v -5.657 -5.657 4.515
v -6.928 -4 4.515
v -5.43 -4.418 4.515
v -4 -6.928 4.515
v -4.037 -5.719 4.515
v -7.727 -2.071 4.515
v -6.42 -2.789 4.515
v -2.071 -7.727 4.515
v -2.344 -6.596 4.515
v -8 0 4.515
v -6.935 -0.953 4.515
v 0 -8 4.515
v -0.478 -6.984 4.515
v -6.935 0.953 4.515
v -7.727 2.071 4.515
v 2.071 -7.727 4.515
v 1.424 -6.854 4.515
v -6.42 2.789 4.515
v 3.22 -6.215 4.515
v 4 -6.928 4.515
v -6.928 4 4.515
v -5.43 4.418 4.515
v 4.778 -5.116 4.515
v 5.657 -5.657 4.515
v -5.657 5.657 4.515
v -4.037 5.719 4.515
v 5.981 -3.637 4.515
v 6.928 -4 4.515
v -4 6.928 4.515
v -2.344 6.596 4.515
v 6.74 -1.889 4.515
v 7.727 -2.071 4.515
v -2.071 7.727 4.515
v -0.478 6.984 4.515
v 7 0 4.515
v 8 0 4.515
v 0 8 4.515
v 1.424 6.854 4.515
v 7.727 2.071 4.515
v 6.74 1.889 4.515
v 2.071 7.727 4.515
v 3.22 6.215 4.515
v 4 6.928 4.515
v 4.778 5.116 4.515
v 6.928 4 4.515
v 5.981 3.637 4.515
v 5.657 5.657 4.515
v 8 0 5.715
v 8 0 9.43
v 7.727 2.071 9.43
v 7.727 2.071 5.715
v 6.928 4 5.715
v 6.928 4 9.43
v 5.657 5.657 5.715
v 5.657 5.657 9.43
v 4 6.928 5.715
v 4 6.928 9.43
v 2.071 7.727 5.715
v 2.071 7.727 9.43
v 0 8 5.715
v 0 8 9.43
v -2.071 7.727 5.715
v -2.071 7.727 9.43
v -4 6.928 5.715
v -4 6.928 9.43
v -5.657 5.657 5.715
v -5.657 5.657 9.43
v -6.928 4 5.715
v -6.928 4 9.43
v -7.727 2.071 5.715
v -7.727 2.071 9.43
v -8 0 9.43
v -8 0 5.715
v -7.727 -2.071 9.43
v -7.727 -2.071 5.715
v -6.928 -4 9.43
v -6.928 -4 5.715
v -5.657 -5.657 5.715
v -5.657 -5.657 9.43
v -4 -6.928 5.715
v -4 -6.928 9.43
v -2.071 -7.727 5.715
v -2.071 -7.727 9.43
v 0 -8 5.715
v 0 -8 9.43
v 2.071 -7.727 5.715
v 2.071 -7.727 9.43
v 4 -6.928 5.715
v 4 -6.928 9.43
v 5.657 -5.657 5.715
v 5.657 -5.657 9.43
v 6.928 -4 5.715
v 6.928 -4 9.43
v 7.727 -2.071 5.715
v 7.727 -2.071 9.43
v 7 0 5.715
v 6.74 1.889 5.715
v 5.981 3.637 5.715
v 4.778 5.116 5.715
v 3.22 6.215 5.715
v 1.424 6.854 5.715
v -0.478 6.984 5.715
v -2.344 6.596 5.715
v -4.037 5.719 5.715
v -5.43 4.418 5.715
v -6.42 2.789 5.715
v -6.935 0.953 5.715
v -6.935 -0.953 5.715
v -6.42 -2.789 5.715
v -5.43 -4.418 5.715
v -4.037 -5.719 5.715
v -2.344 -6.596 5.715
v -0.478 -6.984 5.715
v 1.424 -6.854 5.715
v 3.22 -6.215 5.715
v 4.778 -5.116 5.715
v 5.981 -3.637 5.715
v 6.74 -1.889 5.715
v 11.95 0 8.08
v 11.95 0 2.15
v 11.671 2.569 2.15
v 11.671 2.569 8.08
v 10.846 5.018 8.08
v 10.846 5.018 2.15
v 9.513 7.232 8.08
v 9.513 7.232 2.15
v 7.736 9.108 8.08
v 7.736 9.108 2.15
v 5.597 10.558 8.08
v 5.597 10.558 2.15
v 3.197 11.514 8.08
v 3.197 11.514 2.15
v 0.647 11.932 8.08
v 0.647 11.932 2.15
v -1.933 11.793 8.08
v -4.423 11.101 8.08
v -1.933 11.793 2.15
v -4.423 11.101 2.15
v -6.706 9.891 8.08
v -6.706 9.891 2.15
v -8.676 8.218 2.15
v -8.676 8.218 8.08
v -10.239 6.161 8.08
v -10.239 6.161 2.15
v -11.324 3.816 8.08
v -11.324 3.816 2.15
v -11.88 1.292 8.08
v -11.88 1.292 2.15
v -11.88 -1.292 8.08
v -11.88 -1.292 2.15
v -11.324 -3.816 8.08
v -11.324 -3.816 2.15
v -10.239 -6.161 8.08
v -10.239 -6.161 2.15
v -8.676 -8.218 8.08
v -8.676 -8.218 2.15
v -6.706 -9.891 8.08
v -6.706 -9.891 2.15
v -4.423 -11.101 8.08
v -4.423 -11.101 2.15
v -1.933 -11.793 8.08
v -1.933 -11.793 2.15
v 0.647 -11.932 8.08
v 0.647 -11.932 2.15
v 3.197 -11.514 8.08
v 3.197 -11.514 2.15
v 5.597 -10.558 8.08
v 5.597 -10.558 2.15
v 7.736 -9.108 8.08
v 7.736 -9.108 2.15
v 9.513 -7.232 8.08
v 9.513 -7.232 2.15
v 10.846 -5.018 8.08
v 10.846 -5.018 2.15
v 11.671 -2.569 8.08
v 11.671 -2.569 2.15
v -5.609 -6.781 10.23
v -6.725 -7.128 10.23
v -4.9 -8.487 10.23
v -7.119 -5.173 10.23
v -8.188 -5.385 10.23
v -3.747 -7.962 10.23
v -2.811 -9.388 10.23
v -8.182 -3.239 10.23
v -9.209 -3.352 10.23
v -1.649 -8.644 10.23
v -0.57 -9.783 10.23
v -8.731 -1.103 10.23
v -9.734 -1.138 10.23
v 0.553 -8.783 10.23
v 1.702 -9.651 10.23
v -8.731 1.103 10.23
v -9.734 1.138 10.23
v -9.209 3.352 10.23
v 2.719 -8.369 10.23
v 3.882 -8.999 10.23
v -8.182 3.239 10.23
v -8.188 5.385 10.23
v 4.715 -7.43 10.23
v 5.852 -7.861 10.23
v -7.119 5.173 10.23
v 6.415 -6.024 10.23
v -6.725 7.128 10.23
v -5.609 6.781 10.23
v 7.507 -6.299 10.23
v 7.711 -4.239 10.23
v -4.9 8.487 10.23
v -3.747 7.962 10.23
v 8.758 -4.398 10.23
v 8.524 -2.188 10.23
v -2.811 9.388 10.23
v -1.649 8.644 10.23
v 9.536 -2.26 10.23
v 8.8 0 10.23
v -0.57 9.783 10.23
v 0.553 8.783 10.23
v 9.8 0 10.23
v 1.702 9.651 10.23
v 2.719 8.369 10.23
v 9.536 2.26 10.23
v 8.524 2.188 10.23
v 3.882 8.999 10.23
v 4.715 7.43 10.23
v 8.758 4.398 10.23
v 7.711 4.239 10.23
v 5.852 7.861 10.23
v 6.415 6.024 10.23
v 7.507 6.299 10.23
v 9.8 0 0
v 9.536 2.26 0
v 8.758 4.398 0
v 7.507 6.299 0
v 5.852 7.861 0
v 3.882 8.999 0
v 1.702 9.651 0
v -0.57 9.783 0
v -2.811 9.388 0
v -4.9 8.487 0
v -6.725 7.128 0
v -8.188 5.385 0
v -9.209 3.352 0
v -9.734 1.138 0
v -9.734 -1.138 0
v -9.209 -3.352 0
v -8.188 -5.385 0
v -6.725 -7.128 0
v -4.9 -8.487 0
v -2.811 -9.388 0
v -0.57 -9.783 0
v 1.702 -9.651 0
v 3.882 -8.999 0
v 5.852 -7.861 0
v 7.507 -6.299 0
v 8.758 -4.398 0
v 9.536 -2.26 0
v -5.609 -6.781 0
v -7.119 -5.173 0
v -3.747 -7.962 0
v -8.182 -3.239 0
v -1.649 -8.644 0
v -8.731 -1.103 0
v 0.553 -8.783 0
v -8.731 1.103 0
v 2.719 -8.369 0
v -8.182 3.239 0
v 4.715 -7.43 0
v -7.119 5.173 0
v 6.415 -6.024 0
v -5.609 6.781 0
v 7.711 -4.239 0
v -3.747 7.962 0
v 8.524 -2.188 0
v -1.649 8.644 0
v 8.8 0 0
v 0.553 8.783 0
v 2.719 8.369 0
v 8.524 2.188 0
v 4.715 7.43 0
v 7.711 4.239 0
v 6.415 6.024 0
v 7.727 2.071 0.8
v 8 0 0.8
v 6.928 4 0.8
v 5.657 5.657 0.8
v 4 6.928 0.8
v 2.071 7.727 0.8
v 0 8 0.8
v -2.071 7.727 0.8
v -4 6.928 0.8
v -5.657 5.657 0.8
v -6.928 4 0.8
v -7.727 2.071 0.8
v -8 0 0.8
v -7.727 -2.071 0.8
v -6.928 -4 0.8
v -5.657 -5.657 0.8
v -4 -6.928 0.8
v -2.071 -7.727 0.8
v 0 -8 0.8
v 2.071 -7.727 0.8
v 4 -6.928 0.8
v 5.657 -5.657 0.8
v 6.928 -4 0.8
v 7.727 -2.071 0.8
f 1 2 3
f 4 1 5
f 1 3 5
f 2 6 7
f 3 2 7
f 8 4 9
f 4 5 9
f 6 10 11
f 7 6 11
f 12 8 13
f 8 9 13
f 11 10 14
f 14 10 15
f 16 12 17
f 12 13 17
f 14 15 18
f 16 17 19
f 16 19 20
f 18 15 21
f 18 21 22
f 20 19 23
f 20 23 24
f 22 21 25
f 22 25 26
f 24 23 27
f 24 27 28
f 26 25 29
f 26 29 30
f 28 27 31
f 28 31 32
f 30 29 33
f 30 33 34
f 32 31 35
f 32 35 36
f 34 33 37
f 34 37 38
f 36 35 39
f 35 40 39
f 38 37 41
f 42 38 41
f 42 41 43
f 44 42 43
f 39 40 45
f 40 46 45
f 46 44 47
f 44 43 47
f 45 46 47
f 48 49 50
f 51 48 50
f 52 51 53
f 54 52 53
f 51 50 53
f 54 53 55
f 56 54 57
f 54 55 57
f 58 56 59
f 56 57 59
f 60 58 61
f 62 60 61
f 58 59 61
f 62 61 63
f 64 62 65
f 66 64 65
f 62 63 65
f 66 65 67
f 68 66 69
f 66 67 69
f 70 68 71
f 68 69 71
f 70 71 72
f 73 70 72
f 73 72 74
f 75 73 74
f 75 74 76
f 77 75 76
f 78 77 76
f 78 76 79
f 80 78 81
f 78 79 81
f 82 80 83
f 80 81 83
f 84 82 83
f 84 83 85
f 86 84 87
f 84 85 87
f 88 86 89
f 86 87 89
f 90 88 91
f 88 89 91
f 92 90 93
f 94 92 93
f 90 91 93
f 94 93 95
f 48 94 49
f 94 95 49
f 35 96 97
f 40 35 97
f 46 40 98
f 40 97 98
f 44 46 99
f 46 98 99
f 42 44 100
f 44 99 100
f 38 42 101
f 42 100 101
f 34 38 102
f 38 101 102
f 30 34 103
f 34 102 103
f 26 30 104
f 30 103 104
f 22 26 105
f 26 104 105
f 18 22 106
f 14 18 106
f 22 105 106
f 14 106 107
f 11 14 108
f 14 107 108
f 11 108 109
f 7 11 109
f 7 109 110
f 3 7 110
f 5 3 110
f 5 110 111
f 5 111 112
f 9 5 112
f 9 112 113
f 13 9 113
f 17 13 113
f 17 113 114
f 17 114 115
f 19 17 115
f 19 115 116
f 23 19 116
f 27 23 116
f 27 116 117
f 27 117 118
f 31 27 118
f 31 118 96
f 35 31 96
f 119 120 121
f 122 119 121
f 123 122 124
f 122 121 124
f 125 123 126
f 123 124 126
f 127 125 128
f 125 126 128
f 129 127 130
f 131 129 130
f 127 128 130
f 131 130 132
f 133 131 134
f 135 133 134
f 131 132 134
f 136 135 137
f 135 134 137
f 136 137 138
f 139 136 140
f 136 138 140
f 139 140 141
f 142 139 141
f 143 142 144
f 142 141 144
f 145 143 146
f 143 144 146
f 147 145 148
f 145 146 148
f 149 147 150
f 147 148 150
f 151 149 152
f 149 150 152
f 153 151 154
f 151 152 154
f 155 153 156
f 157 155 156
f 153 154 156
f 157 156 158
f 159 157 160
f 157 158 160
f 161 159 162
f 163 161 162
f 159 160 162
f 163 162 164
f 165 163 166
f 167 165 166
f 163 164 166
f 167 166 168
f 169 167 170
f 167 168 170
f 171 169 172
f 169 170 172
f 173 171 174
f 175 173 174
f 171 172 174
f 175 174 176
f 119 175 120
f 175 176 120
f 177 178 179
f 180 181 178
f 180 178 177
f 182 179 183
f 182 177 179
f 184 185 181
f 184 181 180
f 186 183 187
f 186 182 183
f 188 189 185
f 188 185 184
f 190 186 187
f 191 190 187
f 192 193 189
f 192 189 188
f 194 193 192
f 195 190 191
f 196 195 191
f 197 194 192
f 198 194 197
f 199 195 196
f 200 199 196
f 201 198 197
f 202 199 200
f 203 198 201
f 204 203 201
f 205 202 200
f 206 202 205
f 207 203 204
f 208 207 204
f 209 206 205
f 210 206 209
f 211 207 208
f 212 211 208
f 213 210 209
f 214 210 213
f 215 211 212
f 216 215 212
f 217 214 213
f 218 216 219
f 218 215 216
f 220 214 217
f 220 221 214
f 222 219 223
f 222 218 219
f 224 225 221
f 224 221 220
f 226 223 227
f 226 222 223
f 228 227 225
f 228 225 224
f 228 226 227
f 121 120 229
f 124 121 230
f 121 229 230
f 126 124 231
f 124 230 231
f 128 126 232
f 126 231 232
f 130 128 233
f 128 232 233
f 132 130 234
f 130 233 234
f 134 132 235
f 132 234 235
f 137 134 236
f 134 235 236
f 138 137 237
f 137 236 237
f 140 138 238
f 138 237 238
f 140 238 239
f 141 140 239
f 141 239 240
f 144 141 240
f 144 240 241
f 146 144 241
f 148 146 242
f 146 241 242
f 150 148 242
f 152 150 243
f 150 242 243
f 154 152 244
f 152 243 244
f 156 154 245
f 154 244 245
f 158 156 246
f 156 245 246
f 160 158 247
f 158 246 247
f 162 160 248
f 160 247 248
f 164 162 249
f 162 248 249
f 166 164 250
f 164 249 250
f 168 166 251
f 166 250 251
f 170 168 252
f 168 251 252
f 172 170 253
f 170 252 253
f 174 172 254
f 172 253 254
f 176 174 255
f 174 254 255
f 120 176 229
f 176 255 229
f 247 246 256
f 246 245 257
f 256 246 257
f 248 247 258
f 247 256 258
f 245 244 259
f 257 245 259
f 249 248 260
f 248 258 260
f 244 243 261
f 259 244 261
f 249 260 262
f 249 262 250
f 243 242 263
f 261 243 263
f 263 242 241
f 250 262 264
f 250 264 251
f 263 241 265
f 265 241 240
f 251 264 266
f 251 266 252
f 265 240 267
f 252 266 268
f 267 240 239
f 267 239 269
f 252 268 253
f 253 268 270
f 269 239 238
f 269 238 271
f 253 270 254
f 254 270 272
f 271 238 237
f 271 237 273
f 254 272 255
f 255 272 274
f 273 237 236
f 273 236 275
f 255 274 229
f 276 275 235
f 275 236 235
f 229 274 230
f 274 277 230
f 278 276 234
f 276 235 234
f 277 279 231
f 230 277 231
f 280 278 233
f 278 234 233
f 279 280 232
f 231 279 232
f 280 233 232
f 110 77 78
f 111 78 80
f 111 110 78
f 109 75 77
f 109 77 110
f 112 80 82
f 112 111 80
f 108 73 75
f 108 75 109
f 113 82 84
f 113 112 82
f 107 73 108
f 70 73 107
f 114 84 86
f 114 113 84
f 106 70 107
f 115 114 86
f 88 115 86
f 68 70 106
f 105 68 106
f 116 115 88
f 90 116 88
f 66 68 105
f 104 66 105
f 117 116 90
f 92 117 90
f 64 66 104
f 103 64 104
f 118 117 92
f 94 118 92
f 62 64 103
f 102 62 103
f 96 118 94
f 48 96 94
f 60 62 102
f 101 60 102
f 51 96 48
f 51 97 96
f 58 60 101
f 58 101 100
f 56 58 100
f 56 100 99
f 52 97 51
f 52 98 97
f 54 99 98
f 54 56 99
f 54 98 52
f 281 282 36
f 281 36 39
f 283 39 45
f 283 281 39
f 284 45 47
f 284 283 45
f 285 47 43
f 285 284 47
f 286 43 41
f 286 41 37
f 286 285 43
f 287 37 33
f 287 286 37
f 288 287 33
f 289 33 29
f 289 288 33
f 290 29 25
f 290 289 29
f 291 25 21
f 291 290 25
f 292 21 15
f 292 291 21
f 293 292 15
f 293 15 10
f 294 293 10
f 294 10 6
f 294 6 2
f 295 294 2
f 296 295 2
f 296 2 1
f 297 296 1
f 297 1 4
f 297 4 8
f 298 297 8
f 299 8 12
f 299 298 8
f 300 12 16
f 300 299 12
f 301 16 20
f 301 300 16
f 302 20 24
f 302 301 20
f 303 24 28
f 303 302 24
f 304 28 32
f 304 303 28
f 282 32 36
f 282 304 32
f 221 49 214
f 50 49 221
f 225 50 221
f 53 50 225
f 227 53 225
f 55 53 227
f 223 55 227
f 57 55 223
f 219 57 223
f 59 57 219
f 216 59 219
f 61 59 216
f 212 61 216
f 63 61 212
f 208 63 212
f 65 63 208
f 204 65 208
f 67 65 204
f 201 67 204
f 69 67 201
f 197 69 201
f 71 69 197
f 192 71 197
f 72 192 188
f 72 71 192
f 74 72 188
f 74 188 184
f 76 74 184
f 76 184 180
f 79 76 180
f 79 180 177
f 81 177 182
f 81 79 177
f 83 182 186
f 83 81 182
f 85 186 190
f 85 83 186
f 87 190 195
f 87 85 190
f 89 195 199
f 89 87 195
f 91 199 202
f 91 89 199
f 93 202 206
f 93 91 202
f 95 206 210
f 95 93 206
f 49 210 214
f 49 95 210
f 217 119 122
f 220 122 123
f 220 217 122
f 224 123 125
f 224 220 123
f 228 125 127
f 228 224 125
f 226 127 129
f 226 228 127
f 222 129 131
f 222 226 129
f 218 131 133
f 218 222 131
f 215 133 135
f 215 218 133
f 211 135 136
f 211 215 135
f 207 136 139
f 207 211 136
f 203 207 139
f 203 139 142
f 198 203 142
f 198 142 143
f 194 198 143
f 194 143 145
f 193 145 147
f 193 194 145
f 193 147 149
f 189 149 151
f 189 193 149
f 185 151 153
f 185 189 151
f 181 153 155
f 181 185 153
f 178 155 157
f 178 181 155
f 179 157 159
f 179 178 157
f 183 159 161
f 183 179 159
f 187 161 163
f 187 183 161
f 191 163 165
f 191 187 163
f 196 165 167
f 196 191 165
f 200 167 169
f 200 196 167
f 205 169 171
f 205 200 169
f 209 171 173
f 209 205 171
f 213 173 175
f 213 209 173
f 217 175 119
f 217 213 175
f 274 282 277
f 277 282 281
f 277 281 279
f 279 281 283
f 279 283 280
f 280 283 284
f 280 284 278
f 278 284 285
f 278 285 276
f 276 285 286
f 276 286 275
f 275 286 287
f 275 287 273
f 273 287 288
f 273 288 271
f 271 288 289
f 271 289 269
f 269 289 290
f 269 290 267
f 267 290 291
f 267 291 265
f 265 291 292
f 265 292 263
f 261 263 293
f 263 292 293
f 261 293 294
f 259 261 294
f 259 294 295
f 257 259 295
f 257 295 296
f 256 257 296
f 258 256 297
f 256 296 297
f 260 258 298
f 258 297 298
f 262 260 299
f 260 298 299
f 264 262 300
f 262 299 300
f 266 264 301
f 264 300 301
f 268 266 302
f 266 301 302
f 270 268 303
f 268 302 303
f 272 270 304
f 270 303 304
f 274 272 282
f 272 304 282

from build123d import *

# Parameters (mm, degrees)
SKETCH_1_R          = 11.95
EXTRUDE_1_DEPTH     = 10.23
SKETCH_2_R          = 7
CUT_EXTRUDE_1_DEPTH = 20.754946216
CHAMFER_1_SIZE      = 2.15
SKETCH_3_R          = 8
CUT_EXTRUDE_2_DEPTH = 4.515
CHAMFER_2_SIZE      = 0.8


with BuildPart() as part:
    # Эскиз1 → Бобышка-Вытянуть1 (new body)
    with BuildSketch(Plane.XY):
        Circle(SKETCH_1_R)
    extrude(amount=EXTRUDE_1_DEPTH)

    # Эскиз2 → Вырез-Вытянуть1 (cut, through all)
    with BuildSketch(Plane.XY.offset(10.23)):
        Circle(SKETCH_2_R)
    extrude(amount=-CUT_EXTRUDE_1_DEPTH, mode=Mode.SUBTRACT)

    # Фаска1
    chamfer_1_edges = [part.edges().sort_by_distance(p)[0] for p in [
        (-11.95, 0, 0),
        (-11.95, 0, 10.23),
    ]]
    chamfer(chamfer_1_edges, length=CHAMFER_1_SIZE)

    # Эскиз3 → Вырез-Вытянуть2 (cut)
    with BuildSketch(Plane.XY.offset(10.23)):
        Circle(SKETCH_3_R)
    cut_extrude_2 = extrude(amount=-CUT_EXTRUDE_2_DEPTH, mode=Mode.SUBTRACT)

    # Зеркальное отражение1: Вырез-Вытянуть2 across plane
    add(cut_extrude_2.mirror(Plane(origin=(0, 0, 5.115), x_dir=(1, 0, 0), z_dir=(0, 0, -1))), mode=Mode.SUBTRACT)

    # Фаска2
    chamfer_2_edges = [part.edges().sort_by_distance(p)[0] for p in [
        (-8, 0, 10.23),
        (-8, 0, 0),
    ]]
    chamfer(chamfer_2_edges, length=CHAMFER_2_SIZE)


solid = part.part
